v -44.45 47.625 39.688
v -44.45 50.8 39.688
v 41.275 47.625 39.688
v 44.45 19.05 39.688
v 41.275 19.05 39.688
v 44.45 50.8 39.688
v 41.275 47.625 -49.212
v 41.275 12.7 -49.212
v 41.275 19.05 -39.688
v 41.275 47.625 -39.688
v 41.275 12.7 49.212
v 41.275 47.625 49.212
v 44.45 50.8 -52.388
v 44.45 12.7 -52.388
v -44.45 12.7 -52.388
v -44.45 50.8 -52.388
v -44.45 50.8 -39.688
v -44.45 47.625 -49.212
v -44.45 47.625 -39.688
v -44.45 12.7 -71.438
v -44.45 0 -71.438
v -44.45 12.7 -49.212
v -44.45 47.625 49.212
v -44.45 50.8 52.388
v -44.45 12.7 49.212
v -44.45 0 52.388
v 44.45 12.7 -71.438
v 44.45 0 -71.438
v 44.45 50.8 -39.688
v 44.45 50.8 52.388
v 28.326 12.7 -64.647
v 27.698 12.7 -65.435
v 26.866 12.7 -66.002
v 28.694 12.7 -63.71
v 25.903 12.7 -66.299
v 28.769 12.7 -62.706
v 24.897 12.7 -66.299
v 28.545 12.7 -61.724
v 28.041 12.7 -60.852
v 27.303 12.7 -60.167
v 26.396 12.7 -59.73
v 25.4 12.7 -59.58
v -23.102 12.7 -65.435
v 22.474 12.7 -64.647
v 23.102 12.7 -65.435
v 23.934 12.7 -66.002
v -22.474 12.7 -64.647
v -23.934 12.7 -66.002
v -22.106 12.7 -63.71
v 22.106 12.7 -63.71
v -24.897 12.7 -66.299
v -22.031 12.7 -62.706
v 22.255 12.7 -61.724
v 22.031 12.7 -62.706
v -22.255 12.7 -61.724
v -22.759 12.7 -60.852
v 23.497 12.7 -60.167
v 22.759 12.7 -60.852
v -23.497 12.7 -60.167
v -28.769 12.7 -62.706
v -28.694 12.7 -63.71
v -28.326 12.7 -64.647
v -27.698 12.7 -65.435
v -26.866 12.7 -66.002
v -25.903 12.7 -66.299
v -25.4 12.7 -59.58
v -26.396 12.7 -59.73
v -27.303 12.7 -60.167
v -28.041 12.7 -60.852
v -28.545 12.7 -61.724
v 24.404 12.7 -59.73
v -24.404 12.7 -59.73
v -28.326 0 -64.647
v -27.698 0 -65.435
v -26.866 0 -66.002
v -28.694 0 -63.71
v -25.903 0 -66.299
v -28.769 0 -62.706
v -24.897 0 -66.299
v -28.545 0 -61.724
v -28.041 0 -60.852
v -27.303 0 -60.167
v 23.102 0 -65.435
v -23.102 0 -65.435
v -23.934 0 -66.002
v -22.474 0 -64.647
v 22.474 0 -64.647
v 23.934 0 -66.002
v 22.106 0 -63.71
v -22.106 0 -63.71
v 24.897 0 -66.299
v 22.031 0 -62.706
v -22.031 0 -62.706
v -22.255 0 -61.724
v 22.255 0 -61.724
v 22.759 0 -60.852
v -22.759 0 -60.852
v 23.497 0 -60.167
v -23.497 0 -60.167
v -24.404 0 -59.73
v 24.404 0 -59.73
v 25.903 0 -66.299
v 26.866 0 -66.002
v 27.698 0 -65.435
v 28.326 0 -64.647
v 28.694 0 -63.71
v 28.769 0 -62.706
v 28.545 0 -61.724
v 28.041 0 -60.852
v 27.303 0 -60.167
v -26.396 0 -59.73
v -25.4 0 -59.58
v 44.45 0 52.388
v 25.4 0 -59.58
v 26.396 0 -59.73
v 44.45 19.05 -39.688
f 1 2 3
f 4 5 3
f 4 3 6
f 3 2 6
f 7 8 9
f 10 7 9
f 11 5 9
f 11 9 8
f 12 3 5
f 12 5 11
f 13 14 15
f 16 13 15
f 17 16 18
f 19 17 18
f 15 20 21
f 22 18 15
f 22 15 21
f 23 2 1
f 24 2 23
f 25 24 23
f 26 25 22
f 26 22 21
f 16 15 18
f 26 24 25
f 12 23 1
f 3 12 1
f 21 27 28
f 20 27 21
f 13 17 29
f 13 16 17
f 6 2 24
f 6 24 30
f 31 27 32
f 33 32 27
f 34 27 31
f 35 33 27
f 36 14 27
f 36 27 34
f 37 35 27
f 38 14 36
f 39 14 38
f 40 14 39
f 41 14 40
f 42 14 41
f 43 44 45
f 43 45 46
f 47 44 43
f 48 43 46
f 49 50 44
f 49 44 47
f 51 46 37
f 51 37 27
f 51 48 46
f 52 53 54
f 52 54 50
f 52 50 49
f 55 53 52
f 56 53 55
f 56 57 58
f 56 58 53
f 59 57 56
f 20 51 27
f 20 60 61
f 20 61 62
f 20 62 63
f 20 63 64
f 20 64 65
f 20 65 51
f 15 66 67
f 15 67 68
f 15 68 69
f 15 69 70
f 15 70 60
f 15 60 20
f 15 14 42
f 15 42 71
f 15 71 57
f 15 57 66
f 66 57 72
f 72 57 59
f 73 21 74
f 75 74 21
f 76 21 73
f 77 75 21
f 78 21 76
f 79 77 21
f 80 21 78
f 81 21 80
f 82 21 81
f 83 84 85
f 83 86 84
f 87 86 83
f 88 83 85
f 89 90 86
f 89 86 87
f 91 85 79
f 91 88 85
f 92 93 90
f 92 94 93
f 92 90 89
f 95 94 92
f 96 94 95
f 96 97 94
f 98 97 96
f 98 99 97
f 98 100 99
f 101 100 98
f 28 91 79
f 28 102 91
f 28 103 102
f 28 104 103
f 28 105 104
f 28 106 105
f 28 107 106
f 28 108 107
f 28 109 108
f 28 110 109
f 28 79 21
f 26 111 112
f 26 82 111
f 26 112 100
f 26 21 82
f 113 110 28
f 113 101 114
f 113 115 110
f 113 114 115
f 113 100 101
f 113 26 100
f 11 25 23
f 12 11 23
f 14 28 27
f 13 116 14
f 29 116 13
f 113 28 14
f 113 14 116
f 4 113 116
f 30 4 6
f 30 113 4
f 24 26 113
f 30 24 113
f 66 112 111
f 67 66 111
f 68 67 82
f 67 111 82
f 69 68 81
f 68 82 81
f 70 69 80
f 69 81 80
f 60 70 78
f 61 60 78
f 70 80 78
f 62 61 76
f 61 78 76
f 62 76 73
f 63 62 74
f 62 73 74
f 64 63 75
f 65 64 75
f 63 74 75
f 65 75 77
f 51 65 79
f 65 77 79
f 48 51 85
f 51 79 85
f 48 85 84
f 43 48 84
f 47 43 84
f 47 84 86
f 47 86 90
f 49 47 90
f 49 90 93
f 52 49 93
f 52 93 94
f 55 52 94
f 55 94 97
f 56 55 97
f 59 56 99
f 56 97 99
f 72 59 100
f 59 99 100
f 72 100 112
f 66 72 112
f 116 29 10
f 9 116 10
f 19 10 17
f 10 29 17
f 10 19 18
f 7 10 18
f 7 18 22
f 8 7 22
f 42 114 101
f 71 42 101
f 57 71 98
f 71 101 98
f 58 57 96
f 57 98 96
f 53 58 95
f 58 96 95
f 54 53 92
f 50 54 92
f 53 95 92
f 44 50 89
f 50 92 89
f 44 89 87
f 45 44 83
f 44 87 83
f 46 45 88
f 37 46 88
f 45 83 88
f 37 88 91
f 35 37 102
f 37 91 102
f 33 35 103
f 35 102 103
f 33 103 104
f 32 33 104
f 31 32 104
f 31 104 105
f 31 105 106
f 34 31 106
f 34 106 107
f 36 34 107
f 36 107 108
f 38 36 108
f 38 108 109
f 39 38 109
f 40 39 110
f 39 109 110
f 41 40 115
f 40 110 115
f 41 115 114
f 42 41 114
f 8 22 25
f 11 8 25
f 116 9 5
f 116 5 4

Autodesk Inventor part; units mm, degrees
ref_plane "YZ Plane" through (0, 0, 0) normal (1, 0, 0) x (0, 1, 0)
ref_plane "XZ Plane" through (0, 0, 0) normal (0, 1, 0) x (-1, 0, 0)
ref_plane "XY Plane" through (0, 0, 0) normal (0, 0, 1) x (1, 0, 0)
sketch "Sketch1" plane through (0, 0, 0) normal (0, 1, 0) x (-1, 0, 0)
  line L0 (-44.45, -52.3875) -> (44.45, -52.3875)
  line L1 (44.45, -52.3875) -> (44.45, 52.3875)
  line L2 (44.45, 52.3875) -> (-44.45, 52.3875)
  line L3 (-44.45, 52.3875) -> (-44.45, -52.3875)
  line L4 (-44.45, -52.3875) -> (44.45, 52.3875) construction
  line L5 (44.45, -52.3875) -> (-44.45, 52.3875) construction
  point P0 (0, 0)
  dimension "d0" = 104.775
  dimension "d1" = 88.9
extrude "Extrusion1" add sketch "Sketch1" along normal blind 12.7
sketch "Sketch2" plane through (0, 12.7, 0) normal (0, 1, 0) x (1, 0, 0)
  line L0 (44.45, 52.3875) -> (-44.45, 52.3875) projected
  line L1 (-44.45, 52.3875) -> (-44.45, -52.3875) projected
  line L2 (44.45, 52.3875) -> (-44.45, 52.3875)
  line L3 (-44.45, 52.3875) -> (-44.45, -52.3875)
  line L4 (-44.45, -52.3875) -> (44.45, -52.3875)
  line L5 (44.45, -52.3875) -> (44.45, 52.3875)
  point P0 (0, 0)
  dimension "d4" = 104.775
extrude "Extrusion2" add sketch "Sketch2" along normal blind 38.1
sketch "Sketch4" plane through (-44.45, 0, -52.3875) normal (-1, 0, 0) x (0, 0, 1)
  line L0 (101.6, 47.625) -> (3.175, 47.625)
  line L1 (3.175, 47.625) -> (3.175, 12.7)
  line L2 (3.175, 12.7) -> (101.6, 12.7)
  line L3 (101.6, 12.7) -> (101.6, 47.625)
  line L4 (0, 0) -> (0, 50.8) projected
  line L5 (0, 50.8) -> (104.775, 50.8) projected
  line L6 (104.775, 12.7) -> (104.775, 50.8)
  line L7 (0, 0) -> (104.775, 0) projected
  point P0 (52.3875, 0)
  dimension "d11" = 3.175
  dimension "d12" = 3.175
  dimension "d14" = 12.7
  dimension "d33" = 3.175
extrude "Extrusion3" cut sketch "Sketch4" against normal blind 85.725
sketch "Sketch5" plane through (0, 50.8, 0) normal (0, 1, 0) x (1, 0, 0)
  line L0 (-44.45, 52.3875) -> (-44.45, -52.3875) projected
  line L1 (44.45, -52.3875) -> (44.45, 52.3875) projected
  line L2 (-44.45, -39.6875) -> (44.45, -39.6875)
  line L3 (44.45, -39.6875) -> (44.45, 39.6875)
  line L4 (44.45, 39.6875) -> (-44.45, 39.6875)
  line L5 (-44.45, 39.6875) -> (-44.45, -39.6875)
  line L6 (44.45, 52.3875) -> (-44.45, 52.3875) projected
  line L7 (-44.45, -52.3875) -> (44.45, -52.3875) projected
  point P0 (0, 0)
  dimension "d17" = 12.7
  dimension "d18" = 12.7
extrude "Extrusion4" cut sketch "Sketch5" against normal blind 31.75 contours L4 L1 L2 L0
sketch "Sketch7" plane through (44.45, 0, -52.3875) normal (0, 0, -1) x (-1, 0, 0)
  line L0 (88.9, 0) -> (0, 0) projected
  line L1 (0, 0) -> (0, 50.8) projected
  line L2 (88.9, 0) -> (0, 0)
  line L3 (0, 0) -> (0, 12.7)
  line L4 (0, 12.7) -> (88.9, 12.7)
  line L5 (88.9, 12.7) -> (88.9, 0)
  point P0 (44.45, 0)
  dimension "d30" = 12.7
extrude "Extrusion5" add sketch "Sketch7" along normal blind 19.05
sketch "Sketch8" plane through (-44.45, 12.7, -52.3875) normal (0, 1, 0) x (1, 0, 0)
  line L0 (0, 0) -> (0, 19.05) projected
  line L1 (88.9, 0) -> (88.9, 19.05) projected
  point P0 (44.45, -52.3875)
  point P1 (19.05, 10.5709)
  point P2 (69.85, 10.5709)
  dimension "d34" = 50.8
  dimension "d36" = 19.05
hole "Hole2" at (-25.4, 12.7, -62.9584) at (25.4, 12.7, -62.9584) direction (0, -1, 0) diameter 6.7564 end through all clearance for "Flat Head Machine Screw (82)" size "1/4" standard "Ansi Unified Screw Threads"
properties part number "KVM Holder Left"
